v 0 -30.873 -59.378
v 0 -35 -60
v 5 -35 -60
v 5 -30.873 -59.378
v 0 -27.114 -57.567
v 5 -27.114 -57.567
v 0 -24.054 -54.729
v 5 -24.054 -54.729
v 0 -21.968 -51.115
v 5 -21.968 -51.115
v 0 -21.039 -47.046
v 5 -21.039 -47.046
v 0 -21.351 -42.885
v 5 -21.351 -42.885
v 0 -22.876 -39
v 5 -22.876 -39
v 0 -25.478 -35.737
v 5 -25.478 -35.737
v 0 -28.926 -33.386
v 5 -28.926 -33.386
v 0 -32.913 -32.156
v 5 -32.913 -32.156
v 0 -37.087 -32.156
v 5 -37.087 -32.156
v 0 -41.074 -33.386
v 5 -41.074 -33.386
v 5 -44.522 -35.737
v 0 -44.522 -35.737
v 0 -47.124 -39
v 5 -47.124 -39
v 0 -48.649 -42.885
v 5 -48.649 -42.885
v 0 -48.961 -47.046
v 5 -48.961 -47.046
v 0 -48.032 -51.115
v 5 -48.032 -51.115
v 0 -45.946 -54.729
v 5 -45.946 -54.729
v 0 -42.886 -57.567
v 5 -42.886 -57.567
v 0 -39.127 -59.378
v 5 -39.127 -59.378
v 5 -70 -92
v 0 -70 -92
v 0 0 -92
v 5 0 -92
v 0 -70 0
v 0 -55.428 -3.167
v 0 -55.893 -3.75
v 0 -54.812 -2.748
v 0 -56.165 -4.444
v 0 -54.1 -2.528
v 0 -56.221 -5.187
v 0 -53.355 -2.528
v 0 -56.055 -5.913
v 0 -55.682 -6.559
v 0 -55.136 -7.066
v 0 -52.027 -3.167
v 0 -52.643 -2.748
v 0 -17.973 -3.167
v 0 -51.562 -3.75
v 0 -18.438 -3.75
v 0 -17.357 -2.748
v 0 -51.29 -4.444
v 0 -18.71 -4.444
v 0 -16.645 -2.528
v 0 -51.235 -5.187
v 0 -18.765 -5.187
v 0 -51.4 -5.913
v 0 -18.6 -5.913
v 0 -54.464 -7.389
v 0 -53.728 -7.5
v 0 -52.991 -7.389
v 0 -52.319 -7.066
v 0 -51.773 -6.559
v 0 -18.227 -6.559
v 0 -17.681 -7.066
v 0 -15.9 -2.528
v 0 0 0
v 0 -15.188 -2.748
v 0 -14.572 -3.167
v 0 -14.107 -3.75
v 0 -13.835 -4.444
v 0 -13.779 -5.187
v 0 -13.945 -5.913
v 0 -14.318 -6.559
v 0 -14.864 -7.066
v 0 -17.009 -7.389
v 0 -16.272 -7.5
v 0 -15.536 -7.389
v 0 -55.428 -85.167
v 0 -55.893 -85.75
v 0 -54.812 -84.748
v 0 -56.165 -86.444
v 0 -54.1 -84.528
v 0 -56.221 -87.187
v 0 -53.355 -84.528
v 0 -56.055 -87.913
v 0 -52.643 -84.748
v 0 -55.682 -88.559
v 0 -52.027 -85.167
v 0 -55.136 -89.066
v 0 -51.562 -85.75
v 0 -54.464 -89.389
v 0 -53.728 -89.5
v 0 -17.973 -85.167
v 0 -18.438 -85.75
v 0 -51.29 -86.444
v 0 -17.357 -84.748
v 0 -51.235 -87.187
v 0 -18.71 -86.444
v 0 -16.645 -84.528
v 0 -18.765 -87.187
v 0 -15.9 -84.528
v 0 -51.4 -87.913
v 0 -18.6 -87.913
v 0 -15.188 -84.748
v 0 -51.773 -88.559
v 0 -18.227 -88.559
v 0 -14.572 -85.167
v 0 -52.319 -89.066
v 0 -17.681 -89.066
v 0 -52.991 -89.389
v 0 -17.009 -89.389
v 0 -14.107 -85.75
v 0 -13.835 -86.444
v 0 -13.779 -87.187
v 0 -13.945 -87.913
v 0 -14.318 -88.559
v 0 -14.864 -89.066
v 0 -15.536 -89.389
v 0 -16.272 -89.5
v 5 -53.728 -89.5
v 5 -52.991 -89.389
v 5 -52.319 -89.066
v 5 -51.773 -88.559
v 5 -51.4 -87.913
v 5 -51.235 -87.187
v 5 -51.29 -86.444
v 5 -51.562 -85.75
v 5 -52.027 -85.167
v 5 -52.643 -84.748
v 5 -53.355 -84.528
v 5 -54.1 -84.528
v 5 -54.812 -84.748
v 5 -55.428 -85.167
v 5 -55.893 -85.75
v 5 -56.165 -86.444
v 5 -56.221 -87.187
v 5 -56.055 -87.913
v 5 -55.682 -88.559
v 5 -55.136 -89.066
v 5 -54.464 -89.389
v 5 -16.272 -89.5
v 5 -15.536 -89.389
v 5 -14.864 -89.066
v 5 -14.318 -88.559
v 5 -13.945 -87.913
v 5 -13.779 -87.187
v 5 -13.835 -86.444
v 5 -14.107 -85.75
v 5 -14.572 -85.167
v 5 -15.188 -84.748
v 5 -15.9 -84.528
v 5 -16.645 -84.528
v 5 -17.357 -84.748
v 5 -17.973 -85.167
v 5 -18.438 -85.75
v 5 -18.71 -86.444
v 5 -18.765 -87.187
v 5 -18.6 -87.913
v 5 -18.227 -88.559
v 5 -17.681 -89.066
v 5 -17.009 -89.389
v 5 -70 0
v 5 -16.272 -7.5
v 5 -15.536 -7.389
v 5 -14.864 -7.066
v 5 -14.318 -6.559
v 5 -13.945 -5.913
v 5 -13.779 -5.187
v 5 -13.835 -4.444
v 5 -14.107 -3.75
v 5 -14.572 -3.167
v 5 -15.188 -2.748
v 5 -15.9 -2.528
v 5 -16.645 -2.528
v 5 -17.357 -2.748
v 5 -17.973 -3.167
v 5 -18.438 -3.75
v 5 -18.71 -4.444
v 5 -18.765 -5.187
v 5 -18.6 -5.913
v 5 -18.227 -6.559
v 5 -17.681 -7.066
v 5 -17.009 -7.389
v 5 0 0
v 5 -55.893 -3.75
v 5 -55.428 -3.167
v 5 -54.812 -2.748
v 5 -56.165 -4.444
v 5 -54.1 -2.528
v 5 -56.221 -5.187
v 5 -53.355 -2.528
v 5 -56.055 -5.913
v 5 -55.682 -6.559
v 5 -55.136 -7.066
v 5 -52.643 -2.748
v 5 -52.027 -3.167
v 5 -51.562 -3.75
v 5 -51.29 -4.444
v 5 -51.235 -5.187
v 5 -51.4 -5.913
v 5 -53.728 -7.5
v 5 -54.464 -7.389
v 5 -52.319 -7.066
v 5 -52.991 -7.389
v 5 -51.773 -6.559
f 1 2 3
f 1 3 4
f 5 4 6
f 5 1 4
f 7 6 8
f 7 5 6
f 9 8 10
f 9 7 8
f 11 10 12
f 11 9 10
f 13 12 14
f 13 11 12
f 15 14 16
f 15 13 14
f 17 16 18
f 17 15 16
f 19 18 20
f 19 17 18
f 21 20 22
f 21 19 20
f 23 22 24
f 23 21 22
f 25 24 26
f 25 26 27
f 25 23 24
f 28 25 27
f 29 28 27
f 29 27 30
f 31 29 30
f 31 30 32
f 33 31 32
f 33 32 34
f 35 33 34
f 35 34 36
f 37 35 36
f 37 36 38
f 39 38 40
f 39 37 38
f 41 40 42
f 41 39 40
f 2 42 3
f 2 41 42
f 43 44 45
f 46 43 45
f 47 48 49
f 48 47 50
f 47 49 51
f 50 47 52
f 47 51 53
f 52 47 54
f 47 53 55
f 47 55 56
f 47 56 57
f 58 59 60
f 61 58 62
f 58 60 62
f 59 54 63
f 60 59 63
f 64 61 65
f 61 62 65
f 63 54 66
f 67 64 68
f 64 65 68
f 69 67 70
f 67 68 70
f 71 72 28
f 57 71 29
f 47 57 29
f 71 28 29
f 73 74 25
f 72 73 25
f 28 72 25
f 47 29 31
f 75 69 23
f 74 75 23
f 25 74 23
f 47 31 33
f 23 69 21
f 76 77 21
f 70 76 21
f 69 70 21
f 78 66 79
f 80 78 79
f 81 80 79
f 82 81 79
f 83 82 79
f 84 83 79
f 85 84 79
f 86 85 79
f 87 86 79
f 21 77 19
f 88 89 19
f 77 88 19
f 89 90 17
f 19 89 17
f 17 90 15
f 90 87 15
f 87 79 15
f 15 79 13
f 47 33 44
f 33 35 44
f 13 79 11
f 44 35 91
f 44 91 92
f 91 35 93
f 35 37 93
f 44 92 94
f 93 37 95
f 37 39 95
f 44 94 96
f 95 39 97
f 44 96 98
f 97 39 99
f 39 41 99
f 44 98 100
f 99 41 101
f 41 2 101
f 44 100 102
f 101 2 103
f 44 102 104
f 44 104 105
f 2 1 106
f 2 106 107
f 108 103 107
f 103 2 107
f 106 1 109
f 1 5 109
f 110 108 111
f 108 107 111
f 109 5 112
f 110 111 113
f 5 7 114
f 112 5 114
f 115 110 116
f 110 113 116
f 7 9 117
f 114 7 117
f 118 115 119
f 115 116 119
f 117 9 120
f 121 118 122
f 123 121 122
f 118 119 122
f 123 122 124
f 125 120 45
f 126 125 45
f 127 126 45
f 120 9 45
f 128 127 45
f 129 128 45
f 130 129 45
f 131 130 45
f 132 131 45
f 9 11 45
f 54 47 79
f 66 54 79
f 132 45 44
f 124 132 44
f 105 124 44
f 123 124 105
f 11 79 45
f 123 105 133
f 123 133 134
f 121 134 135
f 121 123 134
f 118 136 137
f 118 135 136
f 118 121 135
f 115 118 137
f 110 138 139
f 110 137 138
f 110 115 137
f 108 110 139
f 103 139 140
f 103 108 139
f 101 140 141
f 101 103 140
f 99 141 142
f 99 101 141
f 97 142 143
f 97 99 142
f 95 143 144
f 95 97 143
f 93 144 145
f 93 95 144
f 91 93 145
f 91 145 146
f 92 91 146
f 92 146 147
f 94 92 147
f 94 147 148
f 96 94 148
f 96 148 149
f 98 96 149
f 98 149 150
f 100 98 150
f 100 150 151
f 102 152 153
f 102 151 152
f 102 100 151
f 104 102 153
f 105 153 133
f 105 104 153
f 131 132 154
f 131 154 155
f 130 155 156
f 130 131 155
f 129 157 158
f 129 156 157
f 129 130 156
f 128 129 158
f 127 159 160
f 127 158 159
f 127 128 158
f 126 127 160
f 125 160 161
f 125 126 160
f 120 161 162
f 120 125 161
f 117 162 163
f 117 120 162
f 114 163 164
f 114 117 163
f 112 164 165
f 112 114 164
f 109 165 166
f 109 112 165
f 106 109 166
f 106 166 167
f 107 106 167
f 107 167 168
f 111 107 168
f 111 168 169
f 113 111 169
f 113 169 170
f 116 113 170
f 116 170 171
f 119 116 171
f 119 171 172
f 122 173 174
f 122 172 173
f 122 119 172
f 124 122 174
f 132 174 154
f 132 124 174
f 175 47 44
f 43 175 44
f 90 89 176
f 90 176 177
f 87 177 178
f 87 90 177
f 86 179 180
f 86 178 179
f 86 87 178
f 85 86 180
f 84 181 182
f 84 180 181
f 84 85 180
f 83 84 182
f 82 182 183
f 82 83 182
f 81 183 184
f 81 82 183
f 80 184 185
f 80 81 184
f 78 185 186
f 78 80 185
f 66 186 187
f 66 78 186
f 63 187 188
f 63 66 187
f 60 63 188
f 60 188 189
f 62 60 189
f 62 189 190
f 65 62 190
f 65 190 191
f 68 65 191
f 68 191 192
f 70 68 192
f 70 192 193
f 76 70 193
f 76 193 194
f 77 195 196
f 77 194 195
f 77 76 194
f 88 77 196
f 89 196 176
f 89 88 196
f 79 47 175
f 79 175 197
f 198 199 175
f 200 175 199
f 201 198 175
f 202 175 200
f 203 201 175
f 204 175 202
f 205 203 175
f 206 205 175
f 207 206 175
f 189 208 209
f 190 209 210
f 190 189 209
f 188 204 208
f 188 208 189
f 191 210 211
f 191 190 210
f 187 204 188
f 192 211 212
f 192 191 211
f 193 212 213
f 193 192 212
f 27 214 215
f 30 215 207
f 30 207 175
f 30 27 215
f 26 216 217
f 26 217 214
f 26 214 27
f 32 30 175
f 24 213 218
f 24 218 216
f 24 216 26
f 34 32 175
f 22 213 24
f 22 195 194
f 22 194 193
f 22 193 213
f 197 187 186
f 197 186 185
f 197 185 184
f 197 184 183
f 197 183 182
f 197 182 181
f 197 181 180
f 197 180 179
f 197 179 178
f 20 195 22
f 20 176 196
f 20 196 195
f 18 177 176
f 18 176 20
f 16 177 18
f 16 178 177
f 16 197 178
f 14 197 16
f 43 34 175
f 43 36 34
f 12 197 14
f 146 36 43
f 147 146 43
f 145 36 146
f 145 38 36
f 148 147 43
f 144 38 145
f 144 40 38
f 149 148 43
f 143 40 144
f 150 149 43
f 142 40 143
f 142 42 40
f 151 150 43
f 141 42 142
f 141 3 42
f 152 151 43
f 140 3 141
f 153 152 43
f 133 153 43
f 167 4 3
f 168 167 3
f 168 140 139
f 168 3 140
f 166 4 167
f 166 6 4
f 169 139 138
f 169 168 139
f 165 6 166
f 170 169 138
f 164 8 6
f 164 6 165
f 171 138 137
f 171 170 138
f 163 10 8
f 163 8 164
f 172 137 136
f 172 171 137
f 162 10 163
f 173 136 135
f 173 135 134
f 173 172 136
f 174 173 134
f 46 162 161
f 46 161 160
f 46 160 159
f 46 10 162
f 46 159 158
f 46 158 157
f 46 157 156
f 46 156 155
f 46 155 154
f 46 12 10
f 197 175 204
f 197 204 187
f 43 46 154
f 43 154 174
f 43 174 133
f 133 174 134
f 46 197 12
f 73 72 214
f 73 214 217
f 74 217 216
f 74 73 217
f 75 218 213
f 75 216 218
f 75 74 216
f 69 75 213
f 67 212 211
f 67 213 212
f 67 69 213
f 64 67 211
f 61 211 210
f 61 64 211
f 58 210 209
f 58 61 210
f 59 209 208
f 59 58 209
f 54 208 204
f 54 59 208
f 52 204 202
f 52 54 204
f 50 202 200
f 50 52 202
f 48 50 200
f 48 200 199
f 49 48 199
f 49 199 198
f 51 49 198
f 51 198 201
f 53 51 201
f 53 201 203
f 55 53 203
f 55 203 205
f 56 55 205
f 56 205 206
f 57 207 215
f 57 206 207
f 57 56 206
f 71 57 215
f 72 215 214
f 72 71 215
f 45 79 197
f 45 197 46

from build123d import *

# Parameters (mm, degrees)
SKETCH1_W               = 92
SKETCH1_H               = 70
SKETCH1_R               = 14
BOSS_EXTRUDE1_DEPTH     = 5
CUT_EXTRUDE1_DEPTH      = 116.71084651
CUT_EXTRUDE1_DEPTH_BACK = 116.71084651
SKETCH2_R               = 2.5


with BuildPart() as part:
    # Sketch1 → Boss-Extrude1 (new body)
    with BuildSketch(Plane(origin=(0, 0, 0), x_dir=(0, 0, -1), z_dir=(1, 0, 0))):
        with Locations((46, -35)):
            Rectangle(SKETCH1_W, SKETCH1_H)
        with Locations((46, -35)):
            Circle(SKETCH1_R, mode=Mode.SUBTRACT)
    extrude(amount=BOSS_EXTRUDE1_DEPTH)

    # Sketch2 → Cut-Extrude1 (cut, two sides: drawn at the far end of the back side and taken through both)
    with BuildSketch(Plane(origin=(5, 0, 0), x_dir=(0, 0, -1), z_dir=(1, 0, 0)).offset(-CUT_EXTRUDE1_DEPTH_BACK)):
        with Locations((5, -16.272445859)):
            Circle(SKETCH2_R)
        with Locations((5, -53.727554141)):
            Circle(SKETCH2_R)
        with Locations((87, -53.727554141)):
            Circle(SKETCH2_R)
        with Locations((87, -16.272445859)):
            Circle(SKETCH2_R)
    extrude(amount=CUT_EXTRUDE1_DEPTH + CUT_EXTRUDE1_DEPTH_BACK, mode=Mode.SUBTRACT)


solid = part.part
